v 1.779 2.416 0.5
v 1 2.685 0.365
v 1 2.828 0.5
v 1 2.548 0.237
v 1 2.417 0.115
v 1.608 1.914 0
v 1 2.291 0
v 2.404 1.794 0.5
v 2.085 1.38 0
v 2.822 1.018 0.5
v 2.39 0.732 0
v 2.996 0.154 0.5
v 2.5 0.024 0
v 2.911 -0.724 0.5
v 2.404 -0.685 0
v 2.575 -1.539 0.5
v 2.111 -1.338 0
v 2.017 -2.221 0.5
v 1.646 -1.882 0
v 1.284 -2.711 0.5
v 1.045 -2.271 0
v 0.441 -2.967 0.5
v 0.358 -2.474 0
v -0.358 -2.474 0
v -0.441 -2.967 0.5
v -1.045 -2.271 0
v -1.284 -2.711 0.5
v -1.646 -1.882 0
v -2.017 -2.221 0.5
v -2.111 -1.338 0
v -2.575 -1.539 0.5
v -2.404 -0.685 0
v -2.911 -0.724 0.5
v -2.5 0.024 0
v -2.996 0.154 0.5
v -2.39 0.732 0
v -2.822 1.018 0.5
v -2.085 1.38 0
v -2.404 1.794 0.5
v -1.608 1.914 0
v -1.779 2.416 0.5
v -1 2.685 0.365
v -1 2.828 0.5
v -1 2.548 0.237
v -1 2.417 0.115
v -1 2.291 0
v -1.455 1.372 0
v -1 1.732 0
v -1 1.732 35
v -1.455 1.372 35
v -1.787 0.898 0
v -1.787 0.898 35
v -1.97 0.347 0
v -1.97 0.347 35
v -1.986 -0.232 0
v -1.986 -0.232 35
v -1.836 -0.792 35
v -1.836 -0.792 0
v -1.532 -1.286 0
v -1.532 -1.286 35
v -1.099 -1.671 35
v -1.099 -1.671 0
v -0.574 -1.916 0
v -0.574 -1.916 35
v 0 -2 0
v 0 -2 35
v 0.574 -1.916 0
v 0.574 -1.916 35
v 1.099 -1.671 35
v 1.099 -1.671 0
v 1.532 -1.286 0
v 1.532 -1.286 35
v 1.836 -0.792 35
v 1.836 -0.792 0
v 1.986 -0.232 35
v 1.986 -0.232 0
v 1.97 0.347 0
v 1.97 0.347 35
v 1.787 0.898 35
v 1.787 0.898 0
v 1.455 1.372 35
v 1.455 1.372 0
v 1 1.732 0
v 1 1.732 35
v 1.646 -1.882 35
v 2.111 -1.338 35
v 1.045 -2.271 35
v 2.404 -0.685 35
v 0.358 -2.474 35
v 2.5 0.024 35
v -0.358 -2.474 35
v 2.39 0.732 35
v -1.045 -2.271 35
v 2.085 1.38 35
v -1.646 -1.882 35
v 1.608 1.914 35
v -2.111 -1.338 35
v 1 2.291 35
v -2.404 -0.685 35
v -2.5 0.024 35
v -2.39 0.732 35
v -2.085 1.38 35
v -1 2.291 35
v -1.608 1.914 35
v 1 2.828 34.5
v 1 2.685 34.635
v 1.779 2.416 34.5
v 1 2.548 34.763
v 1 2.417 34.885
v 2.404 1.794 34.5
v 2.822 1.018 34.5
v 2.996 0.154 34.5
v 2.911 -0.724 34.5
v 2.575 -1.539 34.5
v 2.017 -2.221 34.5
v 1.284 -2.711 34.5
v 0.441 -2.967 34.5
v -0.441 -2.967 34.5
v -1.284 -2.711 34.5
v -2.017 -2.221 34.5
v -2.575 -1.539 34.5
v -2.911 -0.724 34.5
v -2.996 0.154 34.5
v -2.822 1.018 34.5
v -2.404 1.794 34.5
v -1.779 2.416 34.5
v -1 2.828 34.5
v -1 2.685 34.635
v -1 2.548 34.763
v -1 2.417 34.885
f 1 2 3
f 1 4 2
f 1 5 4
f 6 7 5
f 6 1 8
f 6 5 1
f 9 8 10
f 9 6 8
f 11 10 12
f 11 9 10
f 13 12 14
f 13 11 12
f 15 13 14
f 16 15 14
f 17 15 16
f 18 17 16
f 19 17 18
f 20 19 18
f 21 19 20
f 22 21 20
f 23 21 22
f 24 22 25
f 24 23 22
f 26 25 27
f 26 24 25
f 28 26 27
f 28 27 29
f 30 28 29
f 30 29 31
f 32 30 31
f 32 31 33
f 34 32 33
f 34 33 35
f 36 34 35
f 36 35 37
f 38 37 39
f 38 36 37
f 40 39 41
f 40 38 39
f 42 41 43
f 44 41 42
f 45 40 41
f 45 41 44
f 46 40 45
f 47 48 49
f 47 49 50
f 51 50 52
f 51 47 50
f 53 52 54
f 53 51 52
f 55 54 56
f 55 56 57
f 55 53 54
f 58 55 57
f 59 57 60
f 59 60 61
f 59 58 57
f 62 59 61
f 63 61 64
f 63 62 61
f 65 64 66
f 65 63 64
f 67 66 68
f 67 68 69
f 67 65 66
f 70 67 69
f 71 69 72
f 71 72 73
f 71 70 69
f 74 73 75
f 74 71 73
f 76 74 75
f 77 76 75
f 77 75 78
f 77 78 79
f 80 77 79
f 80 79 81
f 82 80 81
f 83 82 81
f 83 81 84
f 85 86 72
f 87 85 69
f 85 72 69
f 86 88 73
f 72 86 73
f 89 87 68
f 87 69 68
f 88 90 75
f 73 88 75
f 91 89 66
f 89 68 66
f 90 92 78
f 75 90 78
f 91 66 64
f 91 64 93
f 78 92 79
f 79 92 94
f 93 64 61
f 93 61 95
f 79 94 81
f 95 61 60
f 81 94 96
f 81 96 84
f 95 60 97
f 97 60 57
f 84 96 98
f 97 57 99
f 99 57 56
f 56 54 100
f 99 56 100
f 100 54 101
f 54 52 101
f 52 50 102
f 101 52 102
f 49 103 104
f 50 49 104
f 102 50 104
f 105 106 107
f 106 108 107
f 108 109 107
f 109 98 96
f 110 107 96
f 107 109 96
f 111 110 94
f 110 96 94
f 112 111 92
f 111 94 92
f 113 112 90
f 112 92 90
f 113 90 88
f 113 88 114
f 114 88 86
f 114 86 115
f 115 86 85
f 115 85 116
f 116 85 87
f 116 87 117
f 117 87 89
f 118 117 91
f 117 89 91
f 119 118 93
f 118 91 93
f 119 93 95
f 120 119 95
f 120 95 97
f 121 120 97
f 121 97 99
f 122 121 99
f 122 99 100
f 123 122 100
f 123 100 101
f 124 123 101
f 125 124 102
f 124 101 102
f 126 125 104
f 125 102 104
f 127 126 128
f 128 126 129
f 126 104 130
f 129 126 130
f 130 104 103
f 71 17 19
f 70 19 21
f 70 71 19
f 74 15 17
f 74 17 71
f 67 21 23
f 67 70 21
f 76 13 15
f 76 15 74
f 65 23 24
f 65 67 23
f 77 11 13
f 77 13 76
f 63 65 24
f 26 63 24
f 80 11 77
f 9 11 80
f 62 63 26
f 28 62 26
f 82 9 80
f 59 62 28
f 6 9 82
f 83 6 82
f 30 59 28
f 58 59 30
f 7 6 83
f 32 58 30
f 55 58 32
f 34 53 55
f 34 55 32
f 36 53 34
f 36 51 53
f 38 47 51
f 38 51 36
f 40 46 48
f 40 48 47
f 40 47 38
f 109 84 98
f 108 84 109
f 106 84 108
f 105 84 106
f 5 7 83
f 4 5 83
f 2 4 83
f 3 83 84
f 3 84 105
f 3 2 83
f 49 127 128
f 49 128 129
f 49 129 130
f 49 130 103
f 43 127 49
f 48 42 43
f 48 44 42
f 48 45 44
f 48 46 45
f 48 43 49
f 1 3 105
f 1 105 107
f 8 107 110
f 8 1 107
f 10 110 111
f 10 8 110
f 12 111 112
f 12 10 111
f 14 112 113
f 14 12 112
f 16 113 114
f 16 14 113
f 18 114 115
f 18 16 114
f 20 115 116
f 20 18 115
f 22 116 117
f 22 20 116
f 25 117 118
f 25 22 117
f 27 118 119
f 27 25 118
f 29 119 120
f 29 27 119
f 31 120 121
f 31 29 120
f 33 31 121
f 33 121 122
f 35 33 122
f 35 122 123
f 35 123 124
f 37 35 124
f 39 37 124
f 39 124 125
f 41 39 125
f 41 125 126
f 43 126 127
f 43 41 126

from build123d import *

# Parameters (mm, degrees)
EXTRUSION2_DEPTH = 35
CHANFREIN1_SIZE  = 0.5


with BuildPart() as part:
    # Esquisse1 → Extrusion2 (new body)
    with BuildSketch(Plane.XY):
        with BuildLine():
            Line((-1, 2.828427125), (-1, 1.732050808))
            ThreePointArc((-1, 1.732050808), (0, -2), (1, 1.732050808))
            Line((1, 1.732050808), (1, 2.828427125))
            ThreePointArc((1, 2.828427125), (0, -3), (-1, 2.828427125))
        make_face()
    extrude(amount=EXTRUSION2_DEPTH)

    # Chanfrein1
    chanfrein1_edges = [part.edges().sort_by_distance(p)[0] for p in [
        (0, -3, 35),
        (0, -3, 0),
    ]]
    chamfer(chanfrein1_edges, length=CHANFREIN1_SIZE)


solid = part.part
